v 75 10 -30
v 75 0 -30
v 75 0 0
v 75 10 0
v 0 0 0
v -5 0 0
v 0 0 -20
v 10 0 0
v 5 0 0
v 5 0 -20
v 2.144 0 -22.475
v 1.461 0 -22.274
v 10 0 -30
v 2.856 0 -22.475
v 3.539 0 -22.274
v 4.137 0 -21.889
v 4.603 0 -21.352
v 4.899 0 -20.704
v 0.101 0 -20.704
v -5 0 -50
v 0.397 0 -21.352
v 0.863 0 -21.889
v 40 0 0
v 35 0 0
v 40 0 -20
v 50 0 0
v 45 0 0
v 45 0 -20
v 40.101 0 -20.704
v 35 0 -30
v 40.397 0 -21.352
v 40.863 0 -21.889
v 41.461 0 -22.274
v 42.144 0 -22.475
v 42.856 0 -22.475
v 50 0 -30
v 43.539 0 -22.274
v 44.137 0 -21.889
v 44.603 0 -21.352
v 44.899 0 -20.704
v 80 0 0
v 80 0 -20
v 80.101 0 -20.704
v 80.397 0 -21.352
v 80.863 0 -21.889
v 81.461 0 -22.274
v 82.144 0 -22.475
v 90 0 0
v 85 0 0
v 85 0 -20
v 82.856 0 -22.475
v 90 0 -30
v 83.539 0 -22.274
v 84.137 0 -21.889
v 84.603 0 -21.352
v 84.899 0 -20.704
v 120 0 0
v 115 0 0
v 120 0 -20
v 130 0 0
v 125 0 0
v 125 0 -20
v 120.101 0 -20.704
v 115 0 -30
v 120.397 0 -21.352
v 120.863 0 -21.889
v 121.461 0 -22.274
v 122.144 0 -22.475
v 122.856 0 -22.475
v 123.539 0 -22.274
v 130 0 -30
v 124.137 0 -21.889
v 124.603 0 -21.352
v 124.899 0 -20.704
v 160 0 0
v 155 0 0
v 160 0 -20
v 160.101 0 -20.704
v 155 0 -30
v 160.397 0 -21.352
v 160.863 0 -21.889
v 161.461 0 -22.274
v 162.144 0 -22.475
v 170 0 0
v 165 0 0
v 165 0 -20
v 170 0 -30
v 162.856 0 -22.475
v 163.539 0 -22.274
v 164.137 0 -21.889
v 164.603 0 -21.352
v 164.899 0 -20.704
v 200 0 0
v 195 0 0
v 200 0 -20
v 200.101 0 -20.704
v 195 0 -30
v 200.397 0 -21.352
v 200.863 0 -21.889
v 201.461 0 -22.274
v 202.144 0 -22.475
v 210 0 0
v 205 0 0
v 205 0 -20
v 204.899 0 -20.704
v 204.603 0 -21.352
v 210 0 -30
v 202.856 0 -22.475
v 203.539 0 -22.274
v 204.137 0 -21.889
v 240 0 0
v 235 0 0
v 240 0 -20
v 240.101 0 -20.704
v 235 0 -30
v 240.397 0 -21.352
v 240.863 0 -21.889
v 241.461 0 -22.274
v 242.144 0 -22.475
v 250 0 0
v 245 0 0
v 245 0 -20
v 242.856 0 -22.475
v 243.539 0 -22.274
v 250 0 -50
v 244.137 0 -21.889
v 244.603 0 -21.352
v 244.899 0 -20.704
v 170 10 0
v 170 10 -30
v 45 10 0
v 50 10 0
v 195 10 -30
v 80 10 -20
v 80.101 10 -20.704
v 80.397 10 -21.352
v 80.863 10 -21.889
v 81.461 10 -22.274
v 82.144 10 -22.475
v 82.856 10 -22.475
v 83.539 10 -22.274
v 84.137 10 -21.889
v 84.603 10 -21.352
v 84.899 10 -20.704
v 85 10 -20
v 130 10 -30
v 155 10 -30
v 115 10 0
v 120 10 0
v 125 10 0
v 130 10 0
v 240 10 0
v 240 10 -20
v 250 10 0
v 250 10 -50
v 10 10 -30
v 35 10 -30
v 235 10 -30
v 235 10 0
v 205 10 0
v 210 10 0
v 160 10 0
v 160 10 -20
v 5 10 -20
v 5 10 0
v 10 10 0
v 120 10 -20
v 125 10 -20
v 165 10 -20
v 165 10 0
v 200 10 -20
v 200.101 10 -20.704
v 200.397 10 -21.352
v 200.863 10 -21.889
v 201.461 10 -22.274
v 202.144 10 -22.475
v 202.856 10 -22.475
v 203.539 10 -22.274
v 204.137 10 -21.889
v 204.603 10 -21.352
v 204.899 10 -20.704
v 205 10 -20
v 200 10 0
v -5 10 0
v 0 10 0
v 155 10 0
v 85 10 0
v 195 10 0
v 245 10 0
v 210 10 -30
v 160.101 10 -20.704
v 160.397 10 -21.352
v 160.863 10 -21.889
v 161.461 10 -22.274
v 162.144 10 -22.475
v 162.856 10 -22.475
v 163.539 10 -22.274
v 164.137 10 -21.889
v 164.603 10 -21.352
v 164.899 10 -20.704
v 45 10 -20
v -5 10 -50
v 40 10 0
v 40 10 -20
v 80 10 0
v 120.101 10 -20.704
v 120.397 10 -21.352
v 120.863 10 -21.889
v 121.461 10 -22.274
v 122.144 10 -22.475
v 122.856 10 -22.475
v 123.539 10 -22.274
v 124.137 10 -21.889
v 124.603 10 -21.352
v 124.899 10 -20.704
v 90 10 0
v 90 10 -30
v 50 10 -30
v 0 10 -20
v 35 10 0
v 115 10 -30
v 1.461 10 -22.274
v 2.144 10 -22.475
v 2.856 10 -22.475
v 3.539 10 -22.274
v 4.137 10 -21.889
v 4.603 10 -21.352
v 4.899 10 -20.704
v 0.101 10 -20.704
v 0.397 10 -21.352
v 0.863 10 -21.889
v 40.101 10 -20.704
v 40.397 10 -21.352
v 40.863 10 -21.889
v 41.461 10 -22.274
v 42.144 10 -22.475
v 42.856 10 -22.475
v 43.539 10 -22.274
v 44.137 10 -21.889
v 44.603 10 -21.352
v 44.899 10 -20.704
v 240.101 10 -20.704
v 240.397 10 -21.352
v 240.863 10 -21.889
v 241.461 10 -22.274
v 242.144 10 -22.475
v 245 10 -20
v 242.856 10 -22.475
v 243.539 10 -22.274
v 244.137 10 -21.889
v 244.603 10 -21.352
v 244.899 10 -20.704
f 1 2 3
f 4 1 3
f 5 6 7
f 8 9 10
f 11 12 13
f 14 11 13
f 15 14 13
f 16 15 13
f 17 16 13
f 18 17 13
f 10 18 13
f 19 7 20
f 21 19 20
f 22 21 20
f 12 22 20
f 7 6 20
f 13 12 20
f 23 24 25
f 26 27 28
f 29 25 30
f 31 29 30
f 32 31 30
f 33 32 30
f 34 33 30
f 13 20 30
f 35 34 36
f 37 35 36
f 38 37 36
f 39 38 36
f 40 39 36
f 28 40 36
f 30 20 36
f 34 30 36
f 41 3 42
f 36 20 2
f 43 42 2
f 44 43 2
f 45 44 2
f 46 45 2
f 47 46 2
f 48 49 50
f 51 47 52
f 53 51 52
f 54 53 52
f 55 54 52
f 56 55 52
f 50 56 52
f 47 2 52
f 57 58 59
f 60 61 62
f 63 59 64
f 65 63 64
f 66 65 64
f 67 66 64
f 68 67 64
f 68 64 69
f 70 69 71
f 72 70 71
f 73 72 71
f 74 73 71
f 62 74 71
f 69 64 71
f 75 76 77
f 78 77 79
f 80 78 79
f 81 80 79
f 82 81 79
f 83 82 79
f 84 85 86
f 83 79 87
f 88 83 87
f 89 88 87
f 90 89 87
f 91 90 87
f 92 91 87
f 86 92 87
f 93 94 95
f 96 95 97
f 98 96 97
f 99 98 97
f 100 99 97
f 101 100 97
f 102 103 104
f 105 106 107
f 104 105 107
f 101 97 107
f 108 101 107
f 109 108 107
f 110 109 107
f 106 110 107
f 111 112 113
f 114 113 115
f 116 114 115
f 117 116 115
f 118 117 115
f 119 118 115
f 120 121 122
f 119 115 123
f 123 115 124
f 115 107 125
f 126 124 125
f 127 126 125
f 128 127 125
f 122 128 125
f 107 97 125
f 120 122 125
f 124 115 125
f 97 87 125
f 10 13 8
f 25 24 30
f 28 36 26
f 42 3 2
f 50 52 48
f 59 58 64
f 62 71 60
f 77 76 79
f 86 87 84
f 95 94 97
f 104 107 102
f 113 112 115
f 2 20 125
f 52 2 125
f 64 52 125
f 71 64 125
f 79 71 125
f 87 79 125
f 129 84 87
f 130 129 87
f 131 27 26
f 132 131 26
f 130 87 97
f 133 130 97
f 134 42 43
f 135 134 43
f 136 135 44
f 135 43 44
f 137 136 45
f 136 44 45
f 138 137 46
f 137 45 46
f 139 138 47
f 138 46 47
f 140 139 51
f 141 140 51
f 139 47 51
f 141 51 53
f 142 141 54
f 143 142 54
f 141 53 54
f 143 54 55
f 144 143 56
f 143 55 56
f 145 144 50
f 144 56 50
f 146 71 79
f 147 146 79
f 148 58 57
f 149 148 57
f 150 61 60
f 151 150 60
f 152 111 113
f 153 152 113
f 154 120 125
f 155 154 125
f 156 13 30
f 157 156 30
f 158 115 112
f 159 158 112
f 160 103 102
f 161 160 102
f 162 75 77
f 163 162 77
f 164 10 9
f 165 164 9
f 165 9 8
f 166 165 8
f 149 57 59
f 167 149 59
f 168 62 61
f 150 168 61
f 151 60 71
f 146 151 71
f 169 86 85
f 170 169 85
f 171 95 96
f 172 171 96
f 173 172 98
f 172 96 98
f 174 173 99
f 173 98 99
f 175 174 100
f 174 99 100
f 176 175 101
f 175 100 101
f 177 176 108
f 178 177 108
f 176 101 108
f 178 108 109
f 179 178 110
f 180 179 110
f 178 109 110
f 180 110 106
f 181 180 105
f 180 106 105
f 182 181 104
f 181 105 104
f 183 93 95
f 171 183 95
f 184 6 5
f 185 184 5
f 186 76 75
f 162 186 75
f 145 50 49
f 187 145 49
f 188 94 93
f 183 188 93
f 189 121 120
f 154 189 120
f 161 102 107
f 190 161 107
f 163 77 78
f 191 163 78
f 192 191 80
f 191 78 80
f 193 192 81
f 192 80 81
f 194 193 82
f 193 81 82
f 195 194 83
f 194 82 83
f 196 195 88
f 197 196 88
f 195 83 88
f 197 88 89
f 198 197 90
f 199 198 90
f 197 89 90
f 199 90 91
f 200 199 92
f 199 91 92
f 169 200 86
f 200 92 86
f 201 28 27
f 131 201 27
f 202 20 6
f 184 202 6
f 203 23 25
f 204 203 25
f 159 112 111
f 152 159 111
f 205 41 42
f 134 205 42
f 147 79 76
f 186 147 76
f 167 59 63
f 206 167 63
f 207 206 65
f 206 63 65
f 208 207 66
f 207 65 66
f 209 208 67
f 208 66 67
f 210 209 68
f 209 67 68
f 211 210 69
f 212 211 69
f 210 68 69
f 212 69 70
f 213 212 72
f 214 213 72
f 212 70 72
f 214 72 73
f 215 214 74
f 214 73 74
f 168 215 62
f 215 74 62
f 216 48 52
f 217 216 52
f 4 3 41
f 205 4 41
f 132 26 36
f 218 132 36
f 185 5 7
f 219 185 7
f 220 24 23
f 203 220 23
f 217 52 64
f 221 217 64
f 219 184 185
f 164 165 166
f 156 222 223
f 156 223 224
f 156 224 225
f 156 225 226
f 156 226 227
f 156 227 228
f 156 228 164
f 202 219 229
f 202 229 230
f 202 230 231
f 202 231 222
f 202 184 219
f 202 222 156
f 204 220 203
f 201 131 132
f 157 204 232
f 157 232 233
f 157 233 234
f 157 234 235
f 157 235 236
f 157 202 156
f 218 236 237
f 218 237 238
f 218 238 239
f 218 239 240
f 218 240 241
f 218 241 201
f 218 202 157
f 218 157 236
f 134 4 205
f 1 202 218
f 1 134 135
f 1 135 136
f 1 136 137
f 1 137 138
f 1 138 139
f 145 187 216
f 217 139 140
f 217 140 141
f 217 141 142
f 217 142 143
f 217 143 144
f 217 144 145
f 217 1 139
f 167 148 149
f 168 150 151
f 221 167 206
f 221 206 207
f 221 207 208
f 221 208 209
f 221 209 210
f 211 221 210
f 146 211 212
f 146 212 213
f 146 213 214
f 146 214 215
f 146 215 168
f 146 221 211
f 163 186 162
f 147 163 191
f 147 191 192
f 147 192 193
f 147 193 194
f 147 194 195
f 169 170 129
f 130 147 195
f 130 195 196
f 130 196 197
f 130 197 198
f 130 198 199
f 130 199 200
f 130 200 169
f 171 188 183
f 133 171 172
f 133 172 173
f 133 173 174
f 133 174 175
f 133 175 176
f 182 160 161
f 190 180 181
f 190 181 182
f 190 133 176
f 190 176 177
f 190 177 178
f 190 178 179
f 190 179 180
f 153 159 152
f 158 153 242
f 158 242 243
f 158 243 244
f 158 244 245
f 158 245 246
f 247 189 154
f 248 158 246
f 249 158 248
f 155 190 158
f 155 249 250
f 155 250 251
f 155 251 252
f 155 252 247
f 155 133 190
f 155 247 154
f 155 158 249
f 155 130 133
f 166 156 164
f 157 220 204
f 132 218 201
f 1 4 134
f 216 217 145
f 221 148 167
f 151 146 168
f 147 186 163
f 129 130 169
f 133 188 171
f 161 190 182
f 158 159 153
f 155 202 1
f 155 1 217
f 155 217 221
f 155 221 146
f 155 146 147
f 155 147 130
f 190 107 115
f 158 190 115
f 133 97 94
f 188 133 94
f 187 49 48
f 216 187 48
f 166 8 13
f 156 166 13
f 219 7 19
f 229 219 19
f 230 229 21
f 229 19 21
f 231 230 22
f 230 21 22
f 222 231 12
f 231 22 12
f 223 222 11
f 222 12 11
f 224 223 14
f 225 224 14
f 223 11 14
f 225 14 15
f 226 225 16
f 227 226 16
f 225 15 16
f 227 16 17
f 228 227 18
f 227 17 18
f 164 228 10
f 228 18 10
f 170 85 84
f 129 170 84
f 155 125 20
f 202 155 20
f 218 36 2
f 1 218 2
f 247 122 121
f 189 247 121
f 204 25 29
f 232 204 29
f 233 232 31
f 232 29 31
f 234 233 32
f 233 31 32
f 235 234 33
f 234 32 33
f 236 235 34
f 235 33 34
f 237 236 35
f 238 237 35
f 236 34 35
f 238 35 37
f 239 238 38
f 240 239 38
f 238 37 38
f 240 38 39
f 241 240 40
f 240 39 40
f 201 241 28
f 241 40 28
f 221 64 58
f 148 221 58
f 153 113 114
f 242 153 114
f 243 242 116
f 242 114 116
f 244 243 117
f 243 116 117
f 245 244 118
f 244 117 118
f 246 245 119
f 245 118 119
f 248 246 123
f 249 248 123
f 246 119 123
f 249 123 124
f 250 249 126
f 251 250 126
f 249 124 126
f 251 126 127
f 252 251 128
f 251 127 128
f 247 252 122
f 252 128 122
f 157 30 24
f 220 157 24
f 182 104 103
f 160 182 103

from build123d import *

# Parameters (mm, degrees)
BOSS_EXTRUDE1_DEPTH = 10


with BuildPart() as part:
    # Sketch1 → Boss-Extrude1 (new body)
    with BuildSketch(Plane(origin=(0, 0, 0), x_dir=(1, 0, 0), z_dir=(0, 1, 0))):
        with BuildLine():
            Line((0, 0), (0, 20))
            ThreePointArc((0, 20), (2.5, 22.5), (5, 20))
            Line((5, 20), (5, 0))
            Line((5, 0), (10, 0))
            Line((10, 0), (10, 30))
            Line((10, 30), (35, 30))
            Line((35, 30), (35, 0))
            Line((35, 0), (40, 0))
            Line((40, 0), (40, 20))
            ThreePointArc((40, 20), (42.5, 22.5), (45, 20))
            Line((45, 20), (45, 0))
            Line((45, 0), (50, 0))
            Line((50, 0), (50, 30))
            Line((50, 30), (75, 30))
            Line((75, 30), (75, 0))
            Line((75, 0), (80, 0))
            Line((80, 0), (80, 20))
            ThreePointArc((80, 20), (82.5, 22.5), (85, 20))
            Line((85, 20), (85, 0))
            Line((85, 0), (90, 0))
            Line((90, 0), (90, 30))
            Line((90, 30), (115, 30))
            Line((115, 30), (115, 0))
            Line((115, 0), (120, 0))
            Line((120, 0), (120, 20))
            ThreePointArc((120, 20), (122.5, 22.5), (125, 20))
            Line((125, 20), (125, 0))
            Line((125, 0), (130, 0))
            Line((130, 0), (130, 30))
            Line((130, 30), (155, 30))
            Line((155, 30), (155, 0))
            Line((155, 0), (160, 0))
            Line((160, 0), (160, 20))
            ThreePointArc((160, 20), (162.5, 22.5), (165, 20))
            Line((165, 20), (165, 0))
            Line((165, 0), (170, 0))
            Line((170, 0), (170, 30))
            Line((170, 30), (195, 30))
            Line((195, 30), (195, 0))
            Line((195, 0), (200, 0))
            Line((200, 0), (200, 20))
            ThreePointArc((200, 20), (202.5, 22.5), (205, 20))
            Line((205, 20), (205, 0))
            Line((205, 0), (210, 0))
            Line((210, 0), (210, 30))
            Line((210, 30), (235, 30))
            Line((235, 30), (235, 0))
            Line((235, 0), (240, 0))
            Line((240, 0), (240, 20))
            ThreePointArc((240, 20), (242.5, 22.5), (245, 20))
            Line((245, 20), (245, 0))
            Line((245, 0), (250, 0))
            Line((250, 0), (250, 30))
            Line((250, 30), (250, 50))
            Line((250, 50), (-5, 50))
            Line((-5, 50), (-5, 30))
            Line((-5, 30), (-5, 0))
            Line((-5, 0), (0, 0))
        make_face()
    extrude(amount=BOSS_EXTRUDE1_DEPTH)


solid = part.part
